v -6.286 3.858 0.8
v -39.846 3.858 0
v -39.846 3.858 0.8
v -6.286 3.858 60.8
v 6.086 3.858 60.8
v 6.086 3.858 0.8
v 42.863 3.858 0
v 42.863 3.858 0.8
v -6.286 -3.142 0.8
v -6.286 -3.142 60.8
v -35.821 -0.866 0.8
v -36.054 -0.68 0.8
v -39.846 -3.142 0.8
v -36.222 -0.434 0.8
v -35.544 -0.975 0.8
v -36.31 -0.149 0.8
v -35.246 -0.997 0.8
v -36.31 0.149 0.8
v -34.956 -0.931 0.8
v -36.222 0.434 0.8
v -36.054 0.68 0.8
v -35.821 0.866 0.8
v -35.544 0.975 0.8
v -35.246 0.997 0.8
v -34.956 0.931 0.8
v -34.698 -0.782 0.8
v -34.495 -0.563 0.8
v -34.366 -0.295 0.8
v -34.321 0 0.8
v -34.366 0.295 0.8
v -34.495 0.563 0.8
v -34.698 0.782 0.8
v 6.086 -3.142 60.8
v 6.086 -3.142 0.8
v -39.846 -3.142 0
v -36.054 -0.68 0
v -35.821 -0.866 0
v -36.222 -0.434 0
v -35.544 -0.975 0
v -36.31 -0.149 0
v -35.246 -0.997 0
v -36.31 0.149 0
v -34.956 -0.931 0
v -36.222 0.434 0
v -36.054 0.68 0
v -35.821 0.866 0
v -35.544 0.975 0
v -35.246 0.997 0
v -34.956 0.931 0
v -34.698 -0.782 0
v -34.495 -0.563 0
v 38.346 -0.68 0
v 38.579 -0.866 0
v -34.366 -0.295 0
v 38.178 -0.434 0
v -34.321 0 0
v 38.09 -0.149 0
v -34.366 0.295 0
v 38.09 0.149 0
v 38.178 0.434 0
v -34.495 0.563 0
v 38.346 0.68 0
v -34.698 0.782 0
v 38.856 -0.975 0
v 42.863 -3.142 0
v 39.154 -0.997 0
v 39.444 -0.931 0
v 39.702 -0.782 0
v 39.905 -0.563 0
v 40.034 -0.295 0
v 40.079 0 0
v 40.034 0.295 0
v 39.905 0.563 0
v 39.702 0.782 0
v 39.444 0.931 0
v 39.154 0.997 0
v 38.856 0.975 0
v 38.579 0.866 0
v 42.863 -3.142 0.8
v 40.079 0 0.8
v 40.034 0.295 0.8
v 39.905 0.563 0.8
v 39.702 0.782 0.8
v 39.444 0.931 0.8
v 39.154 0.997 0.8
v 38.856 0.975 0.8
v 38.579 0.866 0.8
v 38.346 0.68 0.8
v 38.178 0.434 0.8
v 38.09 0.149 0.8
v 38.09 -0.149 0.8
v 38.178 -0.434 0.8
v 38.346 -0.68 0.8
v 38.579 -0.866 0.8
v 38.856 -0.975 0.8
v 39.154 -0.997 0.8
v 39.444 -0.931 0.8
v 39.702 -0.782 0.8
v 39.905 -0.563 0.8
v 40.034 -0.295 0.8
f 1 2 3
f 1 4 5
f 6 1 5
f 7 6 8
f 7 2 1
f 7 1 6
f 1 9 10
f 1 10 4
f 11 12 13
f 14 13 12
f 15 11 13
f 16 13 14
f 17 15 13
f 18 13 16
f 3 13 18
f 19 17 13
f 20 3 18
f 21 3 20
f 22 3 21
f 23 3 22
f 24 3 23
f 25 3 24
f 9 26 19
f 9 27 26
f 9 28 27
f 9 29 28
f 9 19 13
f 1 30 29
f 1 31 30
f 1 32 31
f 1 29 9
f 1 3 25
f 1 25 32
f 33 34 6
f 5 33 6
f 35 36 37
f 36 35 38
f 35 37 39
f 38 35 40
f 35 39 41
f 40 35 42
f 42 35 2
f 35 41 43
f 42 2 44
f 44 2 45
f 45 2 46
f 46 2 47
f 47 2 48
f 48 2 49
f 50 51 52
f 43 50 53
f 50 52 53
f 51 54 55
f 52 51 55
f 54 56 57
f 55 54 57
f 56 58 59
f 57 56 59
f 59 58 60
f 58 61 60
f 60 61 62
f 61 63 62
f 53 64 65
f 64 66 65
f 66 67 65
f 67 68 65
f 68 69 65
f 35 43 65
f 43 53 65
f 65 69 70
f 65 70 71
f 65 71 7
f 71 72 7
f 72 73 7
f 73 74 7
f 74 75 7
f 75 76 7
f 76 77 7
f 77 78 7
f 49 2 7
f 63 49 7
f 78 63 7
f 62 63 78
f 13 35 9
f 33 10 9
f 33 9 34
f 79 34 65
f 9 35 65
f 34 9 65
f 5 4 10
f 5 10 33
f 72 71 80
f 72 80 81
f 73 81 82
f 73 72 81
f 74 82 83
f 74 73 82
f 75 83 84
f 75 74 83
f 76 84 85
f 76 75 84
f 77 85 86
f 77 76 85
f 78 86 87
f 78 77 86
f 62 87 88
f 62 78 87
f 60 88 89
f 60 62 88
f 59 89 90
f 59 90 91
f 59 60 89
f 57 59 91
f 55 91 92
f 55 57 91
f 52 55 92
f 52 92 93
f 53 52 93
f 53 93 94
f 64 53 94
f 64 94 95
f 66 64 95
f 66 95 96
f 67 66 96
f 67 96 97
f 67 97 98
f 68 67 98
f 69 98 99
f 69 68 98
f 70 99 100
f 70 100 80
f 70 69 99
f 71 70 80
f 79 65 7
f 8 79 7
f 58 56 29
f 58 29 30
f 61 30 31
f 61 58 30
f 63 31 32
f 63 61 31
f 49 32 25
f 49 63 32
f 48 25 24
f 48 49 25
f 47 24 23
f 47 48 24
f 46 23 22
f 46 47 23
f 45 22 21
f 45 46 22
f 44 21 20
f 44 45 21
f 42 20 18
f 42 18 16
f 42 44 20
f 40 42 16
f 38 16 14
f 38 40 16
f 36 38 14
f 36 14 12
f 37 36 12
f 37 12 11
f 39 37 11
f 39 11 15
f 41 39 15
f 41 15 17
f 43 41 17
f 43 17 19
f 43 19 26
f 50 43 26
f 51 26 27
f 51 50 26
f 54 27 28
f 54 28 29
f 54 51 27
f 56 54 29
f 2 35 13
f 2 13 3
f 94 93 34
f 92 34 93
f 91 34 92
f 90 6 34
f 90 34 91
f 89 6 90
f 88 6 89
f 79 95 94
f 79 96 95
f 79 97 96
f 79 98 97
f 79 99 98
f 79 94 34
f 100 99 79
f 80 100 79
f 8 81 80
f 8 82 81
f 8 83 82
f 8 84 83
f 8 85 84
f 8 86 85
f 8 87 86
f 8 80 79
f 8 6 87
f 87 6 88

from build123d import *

# Parameters (mm, degrees)
F0_W     = 82.709495
F0_H     = 7
F0_R     = 1
F1_DEPTH = 0.8
F2_W     = 12.371881
F2_H     = 7
F3_DEPTH = 60


with BuildPart() as f1:
    # F0 (on Top) → F1 (new body)
    with BuildSketch(Plane.XY):
        with Locations((1.508386, 0.357548)):
            Rectangle(F0_W, F0_H)
        with Locations((-35.321221, 0)):
            Circle(F0_R, mode=Mode.SUBTRACT)
        with Locations((39.078779, 0)):
            Circle(F0_R, mode=Mode.SUBTRACT)
    extrude(amount=F1_DEPTH)

    # F2 (on face) → F3 (join)
    with BuildSketch(Plane.XY.offset(0.8)):
        with Locations((-0.099949, 0.357548)):
            Rectangle(F2_W, F2_H)
    extrude(amount=F3_DEPTH)


solid = f1.part
